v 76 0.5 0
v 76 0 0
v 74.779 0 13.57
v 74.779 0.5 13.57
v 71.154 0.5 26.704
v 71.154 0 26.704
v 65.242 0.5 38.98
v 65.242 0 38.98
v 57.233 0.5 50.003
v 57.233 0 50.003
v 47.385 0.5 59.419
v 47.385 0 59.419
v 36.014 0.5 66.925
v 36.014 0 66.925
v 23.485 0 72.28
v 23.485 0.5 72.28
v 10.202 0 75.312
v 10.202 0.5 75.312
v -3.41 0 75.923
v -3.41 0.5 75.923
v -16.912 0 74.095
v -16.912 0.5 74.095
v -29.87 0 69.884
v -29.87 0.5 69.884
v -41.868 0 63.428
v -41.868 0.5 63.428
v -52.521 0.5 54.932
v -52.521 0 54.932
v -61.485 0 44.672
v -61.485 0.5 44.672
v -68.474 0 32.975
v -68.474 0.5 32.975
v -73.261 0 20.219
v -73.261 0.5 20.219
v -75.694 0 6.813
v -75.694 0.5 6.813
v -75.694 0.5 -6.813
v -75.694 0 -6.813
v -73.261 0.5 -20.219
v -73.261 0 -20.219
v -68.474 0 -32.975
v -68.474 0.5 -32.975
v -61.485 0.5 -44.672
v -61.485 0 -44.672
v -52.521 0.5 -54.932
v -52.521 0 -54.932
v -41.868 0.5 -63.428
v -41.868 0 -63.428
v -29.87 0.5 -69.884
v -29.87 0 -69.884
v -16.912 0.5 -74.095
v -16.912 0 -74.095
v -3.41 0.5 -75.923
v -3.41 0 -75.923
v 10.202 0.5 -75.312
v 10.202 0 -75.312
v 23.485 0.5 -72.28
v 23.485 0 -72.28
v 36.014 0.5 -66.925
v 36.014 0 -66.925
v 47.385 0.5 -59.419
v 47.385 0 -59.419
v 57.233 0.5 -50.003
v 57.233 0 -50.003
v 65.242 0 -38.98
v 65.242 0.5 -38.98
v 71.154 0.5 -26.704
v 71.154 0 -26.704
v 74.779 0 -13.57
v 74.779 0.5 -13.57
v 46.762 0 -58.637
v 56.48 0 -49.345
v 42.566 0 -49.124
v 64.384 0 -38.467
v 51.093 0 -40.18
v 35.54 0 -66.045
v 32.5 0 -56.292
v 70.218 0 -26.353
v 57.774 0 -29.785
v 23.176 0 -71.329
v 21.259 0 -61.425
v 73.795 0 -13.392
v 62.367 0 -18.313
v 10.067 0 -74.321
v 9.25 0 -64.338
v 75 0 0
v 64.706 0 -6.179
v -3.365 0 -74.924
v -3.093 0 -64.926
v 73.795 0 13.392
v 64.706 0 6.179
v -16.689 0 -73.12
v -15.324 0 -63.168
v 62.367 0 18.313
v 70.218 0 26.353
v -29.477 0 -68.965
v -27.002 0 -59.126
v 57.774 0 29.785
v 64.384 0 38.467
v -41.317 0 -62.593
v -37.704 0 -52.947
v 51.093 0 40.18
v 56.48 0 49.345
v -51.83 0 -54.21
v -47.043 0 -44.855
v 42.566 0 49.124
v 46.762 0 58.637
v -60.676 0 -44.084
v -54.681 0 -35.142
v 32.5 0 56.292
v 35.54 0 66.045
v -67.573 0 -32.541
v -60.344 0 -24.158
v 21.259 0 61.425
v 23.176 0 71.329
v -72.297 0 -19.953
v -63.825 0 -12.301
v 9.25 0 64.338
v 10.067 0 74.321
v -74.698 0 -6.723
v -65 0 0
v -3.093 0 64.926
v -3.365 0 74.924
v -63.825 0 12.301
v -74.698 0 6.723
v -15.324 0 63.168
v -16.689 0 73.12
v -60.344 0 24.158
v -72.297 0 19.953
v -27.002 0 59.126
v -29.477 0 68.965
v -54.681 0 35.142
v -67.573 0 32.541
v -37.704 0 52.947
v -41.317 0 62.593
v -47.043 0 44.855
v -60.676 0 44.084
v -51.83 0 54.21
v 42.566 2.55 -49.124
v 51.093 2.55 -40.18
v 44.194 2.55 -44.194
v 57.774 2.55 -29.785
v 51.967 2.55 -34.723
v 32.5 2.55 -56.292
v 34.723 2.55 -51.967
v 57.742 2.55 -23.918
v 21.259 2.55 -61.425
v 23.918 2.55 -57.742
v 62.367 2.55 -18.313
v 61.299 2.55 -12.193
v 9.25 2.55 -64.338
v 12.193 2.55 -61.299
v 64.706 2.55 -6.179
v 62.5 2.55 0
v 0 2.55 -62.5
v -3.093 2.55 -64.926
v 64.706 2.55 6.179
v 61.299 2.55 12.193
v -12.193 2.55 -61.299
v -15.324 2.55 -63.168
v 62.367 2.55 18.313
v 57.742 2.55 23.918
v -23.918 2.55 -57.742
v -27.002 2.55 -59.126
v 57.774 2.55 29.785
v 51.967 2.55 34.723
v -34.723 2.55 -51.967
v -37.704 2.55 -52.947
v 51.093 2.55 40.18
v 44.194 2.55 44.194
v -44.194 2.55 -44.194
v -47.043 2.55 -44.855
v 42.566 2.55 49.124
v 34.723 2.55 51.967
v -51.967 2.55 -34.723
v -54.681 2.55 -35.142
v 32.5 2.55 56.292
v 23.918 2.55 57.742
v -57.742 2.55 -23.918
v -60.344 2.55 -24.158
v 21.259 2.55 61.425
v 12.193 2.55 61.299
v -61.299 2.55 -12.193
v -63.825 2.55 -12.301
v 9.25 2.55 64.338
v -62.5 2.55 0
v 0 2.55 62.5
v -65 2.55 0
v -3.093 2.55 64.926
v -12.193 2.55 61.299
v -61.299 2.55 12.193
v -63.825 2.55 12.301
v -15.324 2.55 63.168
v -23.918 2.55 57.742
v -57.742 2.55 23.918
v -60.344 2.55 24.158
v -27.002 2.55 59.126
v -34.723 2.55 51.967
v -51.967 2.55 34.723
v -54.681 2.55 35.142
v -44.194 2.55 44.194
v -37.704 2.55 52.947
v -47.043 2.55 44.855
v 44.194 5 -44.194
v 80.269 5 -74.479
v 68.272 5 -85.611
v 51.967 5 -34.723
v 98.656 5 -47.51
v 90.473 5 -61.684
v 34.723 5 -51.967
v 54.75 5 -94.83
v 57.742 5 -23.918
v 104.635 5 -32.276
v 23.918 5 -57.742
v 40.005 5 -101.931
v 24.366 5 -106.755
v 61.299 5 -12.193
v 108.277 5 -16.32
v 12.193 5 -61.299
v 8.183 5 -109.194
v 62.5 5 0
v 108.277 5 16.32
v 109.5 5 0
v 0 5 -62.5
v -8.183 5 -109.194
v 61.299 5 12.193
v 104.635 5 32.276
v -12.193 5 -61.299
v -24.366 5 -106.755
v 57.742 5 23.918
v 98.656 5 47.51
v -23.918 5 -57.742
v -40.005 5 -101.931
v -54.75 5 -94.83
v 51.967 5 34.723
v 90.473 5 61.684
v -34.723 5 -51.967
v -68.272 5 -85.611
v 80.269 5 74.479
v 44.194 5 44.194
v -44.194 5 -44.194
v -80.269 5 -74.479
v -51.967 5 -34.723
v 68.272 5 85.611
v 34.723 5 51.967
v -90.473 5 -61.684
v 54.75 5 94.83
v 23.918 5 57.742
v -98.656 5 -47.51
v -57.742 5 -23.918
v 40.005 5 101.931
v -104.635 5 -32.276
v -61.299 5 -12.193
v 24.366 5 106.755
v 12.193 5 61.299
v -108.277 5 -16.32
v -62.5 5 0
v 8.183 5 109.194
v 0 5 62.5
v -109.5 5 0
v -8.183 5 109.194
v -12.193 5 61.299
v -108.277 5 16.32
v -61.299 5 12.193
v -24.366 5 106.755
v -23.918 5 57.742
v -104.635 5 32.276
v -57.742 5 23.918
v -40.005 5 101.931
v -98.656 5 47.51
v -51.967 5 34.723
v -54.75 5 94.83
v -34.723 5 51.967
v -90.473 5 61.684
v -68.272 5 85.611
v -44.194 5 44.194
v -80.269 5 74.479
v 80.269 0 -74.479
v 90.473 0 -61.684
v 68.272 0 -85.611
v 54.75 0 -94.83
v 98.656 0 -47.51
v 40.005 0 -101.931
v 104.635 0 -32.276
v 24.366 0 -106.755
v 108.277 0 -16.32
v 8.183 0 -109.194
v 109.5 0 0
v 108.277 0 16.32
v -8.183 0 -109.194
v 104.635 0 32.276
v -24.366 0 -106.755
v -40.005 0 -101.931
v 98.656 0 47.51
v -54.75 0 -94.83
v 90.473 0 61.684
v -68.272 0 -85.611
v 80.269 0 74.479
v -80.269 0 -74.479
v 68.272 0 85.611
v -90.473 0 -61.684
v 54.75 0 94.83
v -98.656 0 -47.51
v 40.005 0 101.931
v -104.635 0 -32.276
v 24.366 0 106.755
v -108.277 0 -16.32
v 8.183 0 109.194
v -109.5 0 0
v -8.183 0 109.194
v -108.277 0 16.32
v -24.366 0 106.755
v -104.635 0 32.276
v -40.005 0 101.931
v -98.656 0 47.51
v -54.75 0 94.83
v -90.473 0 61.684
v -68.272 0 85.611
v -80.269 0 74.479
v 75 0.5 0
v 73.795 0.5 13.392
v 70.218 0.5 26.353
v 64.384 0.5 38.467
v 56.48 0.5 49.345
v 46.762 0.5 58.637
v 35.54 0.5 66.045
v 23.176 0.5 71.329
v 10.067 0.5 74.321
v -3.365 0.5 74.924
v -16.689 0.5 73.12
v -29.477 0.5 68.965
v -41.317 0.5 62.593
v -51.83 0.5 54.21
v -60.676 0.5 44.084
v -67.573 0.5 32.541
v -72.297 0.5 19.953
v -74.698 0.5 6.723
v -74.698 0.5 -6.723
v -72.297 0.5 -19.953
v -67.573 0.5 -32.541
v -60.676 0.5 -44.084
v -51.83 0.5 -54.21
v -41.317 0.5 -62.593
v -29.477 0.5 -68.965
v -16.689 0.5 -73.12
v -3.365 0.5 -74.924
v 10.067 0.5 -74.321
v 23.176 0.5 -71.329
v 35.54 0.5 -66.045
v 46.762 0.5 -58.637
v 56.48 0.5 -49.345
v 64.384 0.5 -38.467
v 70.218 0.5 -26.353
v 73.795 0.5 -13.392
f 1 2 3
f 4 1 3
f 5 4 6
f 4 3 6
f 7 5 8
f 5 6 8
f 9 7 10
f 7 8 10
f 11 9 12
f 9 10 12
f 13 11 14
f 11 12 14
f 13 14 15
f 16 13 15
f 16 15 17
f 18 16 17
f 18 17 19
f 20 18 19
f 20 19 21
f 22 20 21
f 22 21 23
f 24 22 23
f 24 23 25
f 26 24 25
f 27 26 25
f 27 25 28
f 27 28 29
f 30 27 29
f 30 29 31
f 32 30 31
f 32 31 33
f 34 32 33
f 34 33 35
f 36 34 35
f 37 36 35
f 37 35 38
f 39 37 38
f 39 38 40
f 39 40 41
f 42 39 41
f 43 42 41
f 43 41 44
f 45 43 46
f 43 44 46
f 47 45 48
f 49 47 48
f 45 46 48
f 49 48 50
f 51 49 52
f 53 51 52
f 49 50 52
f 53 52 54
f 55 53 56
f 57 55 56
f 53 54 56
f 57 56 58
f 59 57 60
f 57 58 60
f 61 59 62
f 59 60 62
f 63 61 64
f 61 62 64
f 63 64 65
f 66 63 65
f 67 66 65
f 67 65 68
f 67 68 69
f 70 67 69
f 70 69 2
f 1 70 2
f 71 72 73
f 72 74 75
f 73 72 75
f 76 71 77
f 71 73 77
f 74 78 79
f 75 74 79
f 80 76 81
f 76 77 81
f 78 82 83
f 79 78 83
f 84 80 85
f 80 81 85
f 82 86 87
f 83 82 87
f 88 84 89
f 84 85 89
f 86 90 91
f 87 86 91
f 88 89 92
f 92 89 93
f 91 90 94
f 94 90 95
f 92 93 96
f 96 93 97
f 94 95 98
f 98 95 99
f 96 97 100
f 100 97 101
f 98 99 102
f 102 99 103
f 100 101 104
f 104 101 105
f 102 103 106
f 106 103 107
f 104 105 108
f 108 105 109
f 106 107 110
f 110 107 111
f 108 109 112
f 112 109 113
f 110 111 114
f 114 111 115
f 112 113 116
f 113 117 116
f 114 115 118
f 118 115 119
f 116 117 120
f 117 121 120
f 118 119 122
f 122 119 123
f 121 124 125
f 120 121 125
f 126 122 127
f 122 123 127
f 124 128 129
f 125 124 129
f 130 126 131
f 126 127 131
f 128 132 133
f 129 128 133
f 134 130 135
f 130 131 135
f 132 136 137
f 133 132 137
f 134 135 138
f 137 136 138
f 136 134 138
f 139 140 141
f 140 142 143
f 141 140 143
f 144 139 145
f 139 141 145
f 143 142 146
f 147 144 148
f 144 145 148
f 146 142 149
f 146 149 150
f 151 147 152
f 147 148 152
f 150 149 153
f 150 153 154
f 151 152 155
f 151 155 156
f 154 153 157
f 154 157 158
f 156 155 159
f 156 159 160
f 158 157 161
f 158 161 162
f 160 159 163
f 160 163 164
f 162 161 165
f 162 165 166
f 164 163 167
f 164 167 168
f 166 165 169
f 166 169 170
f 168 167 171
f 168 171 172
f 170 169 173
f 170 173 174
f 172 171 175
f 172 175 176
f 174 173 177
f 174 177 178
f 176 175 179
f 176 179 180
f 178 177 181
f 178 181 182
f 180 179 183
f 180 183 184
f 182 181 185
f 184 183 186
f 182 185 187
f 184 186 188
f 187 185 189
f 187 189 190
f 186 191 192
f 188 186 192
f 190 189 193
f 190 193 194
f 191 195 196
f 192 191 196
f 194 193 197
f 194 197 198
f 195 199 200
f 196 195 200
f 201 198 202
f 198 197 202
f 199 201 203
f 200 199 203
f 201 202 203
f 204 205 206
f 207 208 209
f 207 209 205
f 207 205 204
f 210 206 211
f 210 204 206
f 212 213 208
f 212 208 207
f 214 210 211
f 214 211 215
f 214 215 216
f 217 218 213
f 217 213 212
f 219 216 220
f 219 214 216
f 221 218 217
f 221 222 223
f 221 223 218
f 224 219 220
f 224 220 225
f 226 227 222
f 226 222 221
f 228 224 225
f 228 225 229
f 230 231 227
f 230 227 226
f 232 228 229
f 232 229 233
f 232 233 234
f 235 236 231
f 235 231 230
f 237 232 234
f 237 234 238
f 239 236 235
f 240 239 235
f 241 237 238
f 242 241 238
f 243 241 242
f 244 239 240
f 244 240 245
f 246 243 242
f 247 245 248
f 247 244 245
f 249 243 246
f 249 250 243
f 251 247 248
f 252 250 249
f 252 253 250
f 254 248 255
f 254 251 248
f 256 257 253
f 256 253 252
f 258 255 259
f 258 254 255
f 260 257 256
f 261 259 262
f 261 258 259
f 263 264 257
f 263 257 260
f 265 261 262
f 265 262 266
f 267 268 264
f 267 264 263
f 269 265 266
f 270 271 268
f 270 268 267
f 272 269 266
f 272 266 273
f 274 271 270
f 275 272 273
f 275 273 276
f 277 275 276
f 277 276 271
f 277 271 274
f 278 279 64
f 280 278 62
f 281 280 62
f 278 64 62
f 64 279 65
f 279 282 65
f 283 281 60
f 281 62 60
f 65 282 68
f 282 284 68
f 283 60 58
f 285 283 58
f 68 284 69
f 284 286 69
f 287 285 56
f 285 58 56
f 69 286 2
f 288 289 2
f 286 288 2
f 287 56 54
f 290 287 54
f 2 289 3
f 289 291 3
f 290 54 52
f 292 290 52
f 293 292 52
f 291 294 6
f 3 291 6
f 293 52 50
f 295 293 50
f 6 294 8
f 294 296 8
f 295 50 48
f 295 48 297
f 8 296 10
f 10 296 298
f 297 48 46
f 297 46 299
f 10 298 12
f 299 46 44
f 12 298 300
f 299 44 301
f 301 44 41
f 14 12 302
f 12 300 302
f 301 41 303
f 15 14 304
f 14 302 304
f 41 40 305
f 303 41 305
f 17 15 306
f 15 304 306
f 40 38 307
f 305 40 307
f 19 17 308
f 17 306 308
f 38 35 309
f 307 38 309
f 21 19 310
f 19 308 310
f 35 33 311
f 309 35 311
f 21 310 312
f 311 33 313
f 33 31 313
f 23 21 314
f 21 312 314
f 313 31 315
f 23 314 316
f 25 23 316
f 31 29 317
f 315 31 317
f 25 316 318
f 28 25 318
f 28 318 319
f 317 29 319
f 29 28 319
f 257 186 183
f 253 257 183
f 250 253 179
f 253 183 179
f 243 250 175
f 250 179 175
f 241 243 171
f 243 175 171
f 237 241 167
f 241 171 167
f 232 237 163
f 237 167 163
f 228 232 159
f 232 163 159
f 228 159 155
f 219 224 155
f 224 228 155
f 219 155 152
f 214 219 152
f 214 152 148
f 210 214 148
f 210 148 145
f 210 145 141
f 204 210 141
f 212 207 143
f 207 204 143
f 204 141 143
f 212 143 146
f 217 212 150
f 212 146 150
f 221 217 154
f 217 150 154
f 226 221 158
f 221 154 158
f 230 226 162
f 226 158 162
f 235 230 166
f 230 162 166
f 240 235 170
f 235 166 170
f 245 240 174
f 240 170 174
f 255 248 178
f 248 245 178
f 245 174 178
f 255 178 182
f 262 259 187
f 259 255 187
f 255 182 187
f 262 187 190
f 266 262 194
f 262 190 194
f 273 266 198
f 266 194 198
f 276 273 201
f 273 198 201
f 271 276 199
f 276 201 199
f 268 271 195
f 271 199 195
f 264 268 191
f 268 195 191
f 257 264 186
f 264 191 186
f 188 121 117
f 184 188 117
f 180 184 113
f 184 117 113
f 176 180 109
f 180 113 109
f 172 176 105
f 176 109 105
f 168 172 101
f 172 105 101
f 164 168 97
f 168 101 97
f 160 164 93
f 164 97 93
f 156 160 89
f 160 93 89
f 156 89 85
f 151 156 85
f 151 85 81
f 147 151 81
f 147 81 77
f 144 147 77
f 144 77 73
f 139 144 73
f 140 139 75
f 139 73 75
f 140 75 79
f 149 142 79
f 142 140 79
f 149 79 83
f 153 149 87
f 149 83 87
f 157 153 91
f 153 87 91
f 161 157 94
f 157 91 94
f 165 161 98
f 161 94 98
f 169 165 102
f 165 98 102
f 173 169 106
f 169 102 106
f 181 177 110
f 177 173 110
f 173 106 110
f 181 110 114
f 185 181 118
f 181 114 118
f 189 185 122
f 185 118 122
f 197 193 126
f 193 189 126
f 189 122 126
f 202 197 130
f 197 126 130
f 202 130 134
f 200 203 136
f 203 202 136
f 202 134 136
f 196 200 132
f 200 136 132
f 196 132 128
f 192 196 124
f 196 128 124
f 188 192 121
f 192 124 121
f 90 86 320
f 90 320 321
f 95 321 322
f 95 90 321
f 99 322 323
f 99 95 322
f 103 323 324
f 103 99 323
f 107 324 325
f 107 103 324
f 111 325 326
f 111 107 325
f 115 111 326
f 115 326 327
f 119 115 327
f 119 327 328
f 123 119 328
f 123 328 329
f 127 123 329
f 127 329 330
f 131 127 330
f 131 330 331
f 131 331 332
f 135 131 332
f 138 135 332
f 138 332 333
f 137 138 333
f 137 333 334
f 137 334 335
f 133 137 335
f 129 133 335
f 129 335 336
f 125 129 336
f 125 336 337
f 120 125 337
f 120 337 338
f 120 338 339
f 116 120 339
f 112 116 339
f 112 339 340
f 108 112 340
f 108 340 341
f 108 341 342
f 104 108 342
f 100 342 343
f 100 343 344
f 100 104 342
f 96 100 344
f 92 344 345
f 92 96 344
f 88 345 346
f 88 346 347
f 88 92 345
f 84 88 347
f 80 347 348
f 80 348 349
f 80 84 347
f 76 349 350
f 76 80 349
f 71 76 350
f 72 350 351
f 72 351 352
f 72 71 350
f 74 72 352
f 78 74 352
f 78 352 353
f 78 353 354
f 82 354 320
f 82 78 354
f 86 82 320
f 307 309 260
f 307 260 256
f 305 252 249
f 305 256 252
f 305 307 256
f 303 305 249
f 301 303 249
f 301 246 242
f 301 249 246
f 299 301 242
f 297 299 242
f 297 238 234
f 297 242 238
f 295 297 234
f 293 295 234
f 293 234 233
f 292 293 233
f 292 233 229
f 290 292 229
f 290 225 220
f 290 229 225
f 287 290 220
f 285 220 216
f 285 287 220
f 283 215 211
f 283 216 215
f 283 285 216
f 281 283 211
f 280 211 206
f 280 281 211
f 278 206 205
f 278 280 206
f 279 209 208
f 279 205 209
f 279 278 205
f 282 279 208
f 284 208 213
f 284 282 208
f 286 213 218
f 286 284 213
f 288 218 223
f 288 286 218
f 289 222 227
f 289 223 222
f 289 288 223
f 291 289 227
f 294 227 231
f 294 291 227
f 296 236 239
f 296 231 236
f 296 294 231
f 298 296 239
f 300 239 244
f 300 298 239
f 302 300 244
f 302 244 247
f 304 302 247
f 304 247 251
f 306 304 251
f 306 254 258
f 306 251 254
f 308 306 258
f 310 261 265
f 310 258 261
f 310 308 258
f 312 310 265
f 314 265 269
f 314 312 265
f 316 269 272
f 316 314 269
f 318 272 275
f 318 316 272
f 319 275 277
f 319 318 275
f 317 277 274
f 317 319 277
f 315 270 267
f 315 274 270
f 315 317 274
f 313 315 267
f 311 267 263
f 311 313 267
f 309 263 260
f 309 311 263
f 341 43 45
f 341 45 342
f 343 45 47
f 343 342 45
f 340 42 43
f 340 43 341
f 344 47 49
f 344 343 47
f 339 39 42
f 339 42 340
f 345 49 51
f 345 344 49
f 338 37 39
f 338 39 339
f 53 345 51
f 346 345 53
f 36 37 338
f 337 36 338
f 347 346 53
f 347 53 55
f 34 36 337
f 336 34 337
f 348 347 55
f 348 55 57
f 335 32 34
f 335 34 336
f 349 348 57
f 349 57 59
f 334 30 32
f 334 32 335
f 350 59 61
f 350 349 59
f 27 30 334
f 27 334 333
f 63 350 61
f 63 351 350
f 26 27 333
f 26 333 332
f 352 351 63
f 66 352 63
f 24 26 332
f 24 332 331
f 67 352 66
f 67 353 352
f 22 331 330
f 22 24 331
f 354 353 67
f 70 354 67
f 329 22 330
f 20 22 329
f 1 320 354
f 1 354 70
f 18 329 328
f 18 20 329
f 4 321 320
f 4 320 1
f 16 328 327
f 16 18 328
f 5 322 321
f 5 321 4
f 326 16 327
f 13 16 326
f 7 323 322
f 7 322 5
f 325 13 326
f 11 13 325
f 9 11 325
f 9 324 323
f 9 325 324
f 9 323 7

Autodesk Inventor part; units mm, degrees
ref_plane "YZ Plane" through (0, 0, 0) normal (1, 0, 0) x (0, 1, 0)
ref_plane "XZ Plane" through (0, 0, 0) normal (0, 1, 0) x (-1, 0, 0)
ref_plane "XY Plane" through (0, 0, 0) normal (0, 0, 1) x (1, 0, 0)
sketch "Sketch1" plane through (0, 0, 0) normal (0, 1, 0) x (-1, 0, 0)
  circle A0 centre (0, 0) radius 109.5
  circle A1 centre (0, 0) radius 62.5
  circle A2 centre (0, 0) radius 65
  dimension "d0" = 219
  dimension "d1" = 125
  dimension "d2" = 130
extrude "Extrusion1" add sketch "Sketch1" along normal blind 5 contours A0 | A2
extrude "Extrusion2" cut sketch "Sketch1" along normal blind 2.55 contours A2
sketch "Sketch2" plane through (0, 0, 0) normal (0, -1, 0) x (1, 0, 0)
  circle A0 centre (0, 0) radius 75
  circle A1 centre (0, 0) radius 76
  dimension "d7" = 150
  dimension "d8" = 152
extrude "Extrusion3" cut sketch "Sketch2" against normal blind 0.5
sketch "Sketch3" plane through (0, 5, 0) normal (0, 1, 0) x (1, 0, 0)
  circle A0 centre (0, 0) radius 82.5
  dimension "d11" = 165
